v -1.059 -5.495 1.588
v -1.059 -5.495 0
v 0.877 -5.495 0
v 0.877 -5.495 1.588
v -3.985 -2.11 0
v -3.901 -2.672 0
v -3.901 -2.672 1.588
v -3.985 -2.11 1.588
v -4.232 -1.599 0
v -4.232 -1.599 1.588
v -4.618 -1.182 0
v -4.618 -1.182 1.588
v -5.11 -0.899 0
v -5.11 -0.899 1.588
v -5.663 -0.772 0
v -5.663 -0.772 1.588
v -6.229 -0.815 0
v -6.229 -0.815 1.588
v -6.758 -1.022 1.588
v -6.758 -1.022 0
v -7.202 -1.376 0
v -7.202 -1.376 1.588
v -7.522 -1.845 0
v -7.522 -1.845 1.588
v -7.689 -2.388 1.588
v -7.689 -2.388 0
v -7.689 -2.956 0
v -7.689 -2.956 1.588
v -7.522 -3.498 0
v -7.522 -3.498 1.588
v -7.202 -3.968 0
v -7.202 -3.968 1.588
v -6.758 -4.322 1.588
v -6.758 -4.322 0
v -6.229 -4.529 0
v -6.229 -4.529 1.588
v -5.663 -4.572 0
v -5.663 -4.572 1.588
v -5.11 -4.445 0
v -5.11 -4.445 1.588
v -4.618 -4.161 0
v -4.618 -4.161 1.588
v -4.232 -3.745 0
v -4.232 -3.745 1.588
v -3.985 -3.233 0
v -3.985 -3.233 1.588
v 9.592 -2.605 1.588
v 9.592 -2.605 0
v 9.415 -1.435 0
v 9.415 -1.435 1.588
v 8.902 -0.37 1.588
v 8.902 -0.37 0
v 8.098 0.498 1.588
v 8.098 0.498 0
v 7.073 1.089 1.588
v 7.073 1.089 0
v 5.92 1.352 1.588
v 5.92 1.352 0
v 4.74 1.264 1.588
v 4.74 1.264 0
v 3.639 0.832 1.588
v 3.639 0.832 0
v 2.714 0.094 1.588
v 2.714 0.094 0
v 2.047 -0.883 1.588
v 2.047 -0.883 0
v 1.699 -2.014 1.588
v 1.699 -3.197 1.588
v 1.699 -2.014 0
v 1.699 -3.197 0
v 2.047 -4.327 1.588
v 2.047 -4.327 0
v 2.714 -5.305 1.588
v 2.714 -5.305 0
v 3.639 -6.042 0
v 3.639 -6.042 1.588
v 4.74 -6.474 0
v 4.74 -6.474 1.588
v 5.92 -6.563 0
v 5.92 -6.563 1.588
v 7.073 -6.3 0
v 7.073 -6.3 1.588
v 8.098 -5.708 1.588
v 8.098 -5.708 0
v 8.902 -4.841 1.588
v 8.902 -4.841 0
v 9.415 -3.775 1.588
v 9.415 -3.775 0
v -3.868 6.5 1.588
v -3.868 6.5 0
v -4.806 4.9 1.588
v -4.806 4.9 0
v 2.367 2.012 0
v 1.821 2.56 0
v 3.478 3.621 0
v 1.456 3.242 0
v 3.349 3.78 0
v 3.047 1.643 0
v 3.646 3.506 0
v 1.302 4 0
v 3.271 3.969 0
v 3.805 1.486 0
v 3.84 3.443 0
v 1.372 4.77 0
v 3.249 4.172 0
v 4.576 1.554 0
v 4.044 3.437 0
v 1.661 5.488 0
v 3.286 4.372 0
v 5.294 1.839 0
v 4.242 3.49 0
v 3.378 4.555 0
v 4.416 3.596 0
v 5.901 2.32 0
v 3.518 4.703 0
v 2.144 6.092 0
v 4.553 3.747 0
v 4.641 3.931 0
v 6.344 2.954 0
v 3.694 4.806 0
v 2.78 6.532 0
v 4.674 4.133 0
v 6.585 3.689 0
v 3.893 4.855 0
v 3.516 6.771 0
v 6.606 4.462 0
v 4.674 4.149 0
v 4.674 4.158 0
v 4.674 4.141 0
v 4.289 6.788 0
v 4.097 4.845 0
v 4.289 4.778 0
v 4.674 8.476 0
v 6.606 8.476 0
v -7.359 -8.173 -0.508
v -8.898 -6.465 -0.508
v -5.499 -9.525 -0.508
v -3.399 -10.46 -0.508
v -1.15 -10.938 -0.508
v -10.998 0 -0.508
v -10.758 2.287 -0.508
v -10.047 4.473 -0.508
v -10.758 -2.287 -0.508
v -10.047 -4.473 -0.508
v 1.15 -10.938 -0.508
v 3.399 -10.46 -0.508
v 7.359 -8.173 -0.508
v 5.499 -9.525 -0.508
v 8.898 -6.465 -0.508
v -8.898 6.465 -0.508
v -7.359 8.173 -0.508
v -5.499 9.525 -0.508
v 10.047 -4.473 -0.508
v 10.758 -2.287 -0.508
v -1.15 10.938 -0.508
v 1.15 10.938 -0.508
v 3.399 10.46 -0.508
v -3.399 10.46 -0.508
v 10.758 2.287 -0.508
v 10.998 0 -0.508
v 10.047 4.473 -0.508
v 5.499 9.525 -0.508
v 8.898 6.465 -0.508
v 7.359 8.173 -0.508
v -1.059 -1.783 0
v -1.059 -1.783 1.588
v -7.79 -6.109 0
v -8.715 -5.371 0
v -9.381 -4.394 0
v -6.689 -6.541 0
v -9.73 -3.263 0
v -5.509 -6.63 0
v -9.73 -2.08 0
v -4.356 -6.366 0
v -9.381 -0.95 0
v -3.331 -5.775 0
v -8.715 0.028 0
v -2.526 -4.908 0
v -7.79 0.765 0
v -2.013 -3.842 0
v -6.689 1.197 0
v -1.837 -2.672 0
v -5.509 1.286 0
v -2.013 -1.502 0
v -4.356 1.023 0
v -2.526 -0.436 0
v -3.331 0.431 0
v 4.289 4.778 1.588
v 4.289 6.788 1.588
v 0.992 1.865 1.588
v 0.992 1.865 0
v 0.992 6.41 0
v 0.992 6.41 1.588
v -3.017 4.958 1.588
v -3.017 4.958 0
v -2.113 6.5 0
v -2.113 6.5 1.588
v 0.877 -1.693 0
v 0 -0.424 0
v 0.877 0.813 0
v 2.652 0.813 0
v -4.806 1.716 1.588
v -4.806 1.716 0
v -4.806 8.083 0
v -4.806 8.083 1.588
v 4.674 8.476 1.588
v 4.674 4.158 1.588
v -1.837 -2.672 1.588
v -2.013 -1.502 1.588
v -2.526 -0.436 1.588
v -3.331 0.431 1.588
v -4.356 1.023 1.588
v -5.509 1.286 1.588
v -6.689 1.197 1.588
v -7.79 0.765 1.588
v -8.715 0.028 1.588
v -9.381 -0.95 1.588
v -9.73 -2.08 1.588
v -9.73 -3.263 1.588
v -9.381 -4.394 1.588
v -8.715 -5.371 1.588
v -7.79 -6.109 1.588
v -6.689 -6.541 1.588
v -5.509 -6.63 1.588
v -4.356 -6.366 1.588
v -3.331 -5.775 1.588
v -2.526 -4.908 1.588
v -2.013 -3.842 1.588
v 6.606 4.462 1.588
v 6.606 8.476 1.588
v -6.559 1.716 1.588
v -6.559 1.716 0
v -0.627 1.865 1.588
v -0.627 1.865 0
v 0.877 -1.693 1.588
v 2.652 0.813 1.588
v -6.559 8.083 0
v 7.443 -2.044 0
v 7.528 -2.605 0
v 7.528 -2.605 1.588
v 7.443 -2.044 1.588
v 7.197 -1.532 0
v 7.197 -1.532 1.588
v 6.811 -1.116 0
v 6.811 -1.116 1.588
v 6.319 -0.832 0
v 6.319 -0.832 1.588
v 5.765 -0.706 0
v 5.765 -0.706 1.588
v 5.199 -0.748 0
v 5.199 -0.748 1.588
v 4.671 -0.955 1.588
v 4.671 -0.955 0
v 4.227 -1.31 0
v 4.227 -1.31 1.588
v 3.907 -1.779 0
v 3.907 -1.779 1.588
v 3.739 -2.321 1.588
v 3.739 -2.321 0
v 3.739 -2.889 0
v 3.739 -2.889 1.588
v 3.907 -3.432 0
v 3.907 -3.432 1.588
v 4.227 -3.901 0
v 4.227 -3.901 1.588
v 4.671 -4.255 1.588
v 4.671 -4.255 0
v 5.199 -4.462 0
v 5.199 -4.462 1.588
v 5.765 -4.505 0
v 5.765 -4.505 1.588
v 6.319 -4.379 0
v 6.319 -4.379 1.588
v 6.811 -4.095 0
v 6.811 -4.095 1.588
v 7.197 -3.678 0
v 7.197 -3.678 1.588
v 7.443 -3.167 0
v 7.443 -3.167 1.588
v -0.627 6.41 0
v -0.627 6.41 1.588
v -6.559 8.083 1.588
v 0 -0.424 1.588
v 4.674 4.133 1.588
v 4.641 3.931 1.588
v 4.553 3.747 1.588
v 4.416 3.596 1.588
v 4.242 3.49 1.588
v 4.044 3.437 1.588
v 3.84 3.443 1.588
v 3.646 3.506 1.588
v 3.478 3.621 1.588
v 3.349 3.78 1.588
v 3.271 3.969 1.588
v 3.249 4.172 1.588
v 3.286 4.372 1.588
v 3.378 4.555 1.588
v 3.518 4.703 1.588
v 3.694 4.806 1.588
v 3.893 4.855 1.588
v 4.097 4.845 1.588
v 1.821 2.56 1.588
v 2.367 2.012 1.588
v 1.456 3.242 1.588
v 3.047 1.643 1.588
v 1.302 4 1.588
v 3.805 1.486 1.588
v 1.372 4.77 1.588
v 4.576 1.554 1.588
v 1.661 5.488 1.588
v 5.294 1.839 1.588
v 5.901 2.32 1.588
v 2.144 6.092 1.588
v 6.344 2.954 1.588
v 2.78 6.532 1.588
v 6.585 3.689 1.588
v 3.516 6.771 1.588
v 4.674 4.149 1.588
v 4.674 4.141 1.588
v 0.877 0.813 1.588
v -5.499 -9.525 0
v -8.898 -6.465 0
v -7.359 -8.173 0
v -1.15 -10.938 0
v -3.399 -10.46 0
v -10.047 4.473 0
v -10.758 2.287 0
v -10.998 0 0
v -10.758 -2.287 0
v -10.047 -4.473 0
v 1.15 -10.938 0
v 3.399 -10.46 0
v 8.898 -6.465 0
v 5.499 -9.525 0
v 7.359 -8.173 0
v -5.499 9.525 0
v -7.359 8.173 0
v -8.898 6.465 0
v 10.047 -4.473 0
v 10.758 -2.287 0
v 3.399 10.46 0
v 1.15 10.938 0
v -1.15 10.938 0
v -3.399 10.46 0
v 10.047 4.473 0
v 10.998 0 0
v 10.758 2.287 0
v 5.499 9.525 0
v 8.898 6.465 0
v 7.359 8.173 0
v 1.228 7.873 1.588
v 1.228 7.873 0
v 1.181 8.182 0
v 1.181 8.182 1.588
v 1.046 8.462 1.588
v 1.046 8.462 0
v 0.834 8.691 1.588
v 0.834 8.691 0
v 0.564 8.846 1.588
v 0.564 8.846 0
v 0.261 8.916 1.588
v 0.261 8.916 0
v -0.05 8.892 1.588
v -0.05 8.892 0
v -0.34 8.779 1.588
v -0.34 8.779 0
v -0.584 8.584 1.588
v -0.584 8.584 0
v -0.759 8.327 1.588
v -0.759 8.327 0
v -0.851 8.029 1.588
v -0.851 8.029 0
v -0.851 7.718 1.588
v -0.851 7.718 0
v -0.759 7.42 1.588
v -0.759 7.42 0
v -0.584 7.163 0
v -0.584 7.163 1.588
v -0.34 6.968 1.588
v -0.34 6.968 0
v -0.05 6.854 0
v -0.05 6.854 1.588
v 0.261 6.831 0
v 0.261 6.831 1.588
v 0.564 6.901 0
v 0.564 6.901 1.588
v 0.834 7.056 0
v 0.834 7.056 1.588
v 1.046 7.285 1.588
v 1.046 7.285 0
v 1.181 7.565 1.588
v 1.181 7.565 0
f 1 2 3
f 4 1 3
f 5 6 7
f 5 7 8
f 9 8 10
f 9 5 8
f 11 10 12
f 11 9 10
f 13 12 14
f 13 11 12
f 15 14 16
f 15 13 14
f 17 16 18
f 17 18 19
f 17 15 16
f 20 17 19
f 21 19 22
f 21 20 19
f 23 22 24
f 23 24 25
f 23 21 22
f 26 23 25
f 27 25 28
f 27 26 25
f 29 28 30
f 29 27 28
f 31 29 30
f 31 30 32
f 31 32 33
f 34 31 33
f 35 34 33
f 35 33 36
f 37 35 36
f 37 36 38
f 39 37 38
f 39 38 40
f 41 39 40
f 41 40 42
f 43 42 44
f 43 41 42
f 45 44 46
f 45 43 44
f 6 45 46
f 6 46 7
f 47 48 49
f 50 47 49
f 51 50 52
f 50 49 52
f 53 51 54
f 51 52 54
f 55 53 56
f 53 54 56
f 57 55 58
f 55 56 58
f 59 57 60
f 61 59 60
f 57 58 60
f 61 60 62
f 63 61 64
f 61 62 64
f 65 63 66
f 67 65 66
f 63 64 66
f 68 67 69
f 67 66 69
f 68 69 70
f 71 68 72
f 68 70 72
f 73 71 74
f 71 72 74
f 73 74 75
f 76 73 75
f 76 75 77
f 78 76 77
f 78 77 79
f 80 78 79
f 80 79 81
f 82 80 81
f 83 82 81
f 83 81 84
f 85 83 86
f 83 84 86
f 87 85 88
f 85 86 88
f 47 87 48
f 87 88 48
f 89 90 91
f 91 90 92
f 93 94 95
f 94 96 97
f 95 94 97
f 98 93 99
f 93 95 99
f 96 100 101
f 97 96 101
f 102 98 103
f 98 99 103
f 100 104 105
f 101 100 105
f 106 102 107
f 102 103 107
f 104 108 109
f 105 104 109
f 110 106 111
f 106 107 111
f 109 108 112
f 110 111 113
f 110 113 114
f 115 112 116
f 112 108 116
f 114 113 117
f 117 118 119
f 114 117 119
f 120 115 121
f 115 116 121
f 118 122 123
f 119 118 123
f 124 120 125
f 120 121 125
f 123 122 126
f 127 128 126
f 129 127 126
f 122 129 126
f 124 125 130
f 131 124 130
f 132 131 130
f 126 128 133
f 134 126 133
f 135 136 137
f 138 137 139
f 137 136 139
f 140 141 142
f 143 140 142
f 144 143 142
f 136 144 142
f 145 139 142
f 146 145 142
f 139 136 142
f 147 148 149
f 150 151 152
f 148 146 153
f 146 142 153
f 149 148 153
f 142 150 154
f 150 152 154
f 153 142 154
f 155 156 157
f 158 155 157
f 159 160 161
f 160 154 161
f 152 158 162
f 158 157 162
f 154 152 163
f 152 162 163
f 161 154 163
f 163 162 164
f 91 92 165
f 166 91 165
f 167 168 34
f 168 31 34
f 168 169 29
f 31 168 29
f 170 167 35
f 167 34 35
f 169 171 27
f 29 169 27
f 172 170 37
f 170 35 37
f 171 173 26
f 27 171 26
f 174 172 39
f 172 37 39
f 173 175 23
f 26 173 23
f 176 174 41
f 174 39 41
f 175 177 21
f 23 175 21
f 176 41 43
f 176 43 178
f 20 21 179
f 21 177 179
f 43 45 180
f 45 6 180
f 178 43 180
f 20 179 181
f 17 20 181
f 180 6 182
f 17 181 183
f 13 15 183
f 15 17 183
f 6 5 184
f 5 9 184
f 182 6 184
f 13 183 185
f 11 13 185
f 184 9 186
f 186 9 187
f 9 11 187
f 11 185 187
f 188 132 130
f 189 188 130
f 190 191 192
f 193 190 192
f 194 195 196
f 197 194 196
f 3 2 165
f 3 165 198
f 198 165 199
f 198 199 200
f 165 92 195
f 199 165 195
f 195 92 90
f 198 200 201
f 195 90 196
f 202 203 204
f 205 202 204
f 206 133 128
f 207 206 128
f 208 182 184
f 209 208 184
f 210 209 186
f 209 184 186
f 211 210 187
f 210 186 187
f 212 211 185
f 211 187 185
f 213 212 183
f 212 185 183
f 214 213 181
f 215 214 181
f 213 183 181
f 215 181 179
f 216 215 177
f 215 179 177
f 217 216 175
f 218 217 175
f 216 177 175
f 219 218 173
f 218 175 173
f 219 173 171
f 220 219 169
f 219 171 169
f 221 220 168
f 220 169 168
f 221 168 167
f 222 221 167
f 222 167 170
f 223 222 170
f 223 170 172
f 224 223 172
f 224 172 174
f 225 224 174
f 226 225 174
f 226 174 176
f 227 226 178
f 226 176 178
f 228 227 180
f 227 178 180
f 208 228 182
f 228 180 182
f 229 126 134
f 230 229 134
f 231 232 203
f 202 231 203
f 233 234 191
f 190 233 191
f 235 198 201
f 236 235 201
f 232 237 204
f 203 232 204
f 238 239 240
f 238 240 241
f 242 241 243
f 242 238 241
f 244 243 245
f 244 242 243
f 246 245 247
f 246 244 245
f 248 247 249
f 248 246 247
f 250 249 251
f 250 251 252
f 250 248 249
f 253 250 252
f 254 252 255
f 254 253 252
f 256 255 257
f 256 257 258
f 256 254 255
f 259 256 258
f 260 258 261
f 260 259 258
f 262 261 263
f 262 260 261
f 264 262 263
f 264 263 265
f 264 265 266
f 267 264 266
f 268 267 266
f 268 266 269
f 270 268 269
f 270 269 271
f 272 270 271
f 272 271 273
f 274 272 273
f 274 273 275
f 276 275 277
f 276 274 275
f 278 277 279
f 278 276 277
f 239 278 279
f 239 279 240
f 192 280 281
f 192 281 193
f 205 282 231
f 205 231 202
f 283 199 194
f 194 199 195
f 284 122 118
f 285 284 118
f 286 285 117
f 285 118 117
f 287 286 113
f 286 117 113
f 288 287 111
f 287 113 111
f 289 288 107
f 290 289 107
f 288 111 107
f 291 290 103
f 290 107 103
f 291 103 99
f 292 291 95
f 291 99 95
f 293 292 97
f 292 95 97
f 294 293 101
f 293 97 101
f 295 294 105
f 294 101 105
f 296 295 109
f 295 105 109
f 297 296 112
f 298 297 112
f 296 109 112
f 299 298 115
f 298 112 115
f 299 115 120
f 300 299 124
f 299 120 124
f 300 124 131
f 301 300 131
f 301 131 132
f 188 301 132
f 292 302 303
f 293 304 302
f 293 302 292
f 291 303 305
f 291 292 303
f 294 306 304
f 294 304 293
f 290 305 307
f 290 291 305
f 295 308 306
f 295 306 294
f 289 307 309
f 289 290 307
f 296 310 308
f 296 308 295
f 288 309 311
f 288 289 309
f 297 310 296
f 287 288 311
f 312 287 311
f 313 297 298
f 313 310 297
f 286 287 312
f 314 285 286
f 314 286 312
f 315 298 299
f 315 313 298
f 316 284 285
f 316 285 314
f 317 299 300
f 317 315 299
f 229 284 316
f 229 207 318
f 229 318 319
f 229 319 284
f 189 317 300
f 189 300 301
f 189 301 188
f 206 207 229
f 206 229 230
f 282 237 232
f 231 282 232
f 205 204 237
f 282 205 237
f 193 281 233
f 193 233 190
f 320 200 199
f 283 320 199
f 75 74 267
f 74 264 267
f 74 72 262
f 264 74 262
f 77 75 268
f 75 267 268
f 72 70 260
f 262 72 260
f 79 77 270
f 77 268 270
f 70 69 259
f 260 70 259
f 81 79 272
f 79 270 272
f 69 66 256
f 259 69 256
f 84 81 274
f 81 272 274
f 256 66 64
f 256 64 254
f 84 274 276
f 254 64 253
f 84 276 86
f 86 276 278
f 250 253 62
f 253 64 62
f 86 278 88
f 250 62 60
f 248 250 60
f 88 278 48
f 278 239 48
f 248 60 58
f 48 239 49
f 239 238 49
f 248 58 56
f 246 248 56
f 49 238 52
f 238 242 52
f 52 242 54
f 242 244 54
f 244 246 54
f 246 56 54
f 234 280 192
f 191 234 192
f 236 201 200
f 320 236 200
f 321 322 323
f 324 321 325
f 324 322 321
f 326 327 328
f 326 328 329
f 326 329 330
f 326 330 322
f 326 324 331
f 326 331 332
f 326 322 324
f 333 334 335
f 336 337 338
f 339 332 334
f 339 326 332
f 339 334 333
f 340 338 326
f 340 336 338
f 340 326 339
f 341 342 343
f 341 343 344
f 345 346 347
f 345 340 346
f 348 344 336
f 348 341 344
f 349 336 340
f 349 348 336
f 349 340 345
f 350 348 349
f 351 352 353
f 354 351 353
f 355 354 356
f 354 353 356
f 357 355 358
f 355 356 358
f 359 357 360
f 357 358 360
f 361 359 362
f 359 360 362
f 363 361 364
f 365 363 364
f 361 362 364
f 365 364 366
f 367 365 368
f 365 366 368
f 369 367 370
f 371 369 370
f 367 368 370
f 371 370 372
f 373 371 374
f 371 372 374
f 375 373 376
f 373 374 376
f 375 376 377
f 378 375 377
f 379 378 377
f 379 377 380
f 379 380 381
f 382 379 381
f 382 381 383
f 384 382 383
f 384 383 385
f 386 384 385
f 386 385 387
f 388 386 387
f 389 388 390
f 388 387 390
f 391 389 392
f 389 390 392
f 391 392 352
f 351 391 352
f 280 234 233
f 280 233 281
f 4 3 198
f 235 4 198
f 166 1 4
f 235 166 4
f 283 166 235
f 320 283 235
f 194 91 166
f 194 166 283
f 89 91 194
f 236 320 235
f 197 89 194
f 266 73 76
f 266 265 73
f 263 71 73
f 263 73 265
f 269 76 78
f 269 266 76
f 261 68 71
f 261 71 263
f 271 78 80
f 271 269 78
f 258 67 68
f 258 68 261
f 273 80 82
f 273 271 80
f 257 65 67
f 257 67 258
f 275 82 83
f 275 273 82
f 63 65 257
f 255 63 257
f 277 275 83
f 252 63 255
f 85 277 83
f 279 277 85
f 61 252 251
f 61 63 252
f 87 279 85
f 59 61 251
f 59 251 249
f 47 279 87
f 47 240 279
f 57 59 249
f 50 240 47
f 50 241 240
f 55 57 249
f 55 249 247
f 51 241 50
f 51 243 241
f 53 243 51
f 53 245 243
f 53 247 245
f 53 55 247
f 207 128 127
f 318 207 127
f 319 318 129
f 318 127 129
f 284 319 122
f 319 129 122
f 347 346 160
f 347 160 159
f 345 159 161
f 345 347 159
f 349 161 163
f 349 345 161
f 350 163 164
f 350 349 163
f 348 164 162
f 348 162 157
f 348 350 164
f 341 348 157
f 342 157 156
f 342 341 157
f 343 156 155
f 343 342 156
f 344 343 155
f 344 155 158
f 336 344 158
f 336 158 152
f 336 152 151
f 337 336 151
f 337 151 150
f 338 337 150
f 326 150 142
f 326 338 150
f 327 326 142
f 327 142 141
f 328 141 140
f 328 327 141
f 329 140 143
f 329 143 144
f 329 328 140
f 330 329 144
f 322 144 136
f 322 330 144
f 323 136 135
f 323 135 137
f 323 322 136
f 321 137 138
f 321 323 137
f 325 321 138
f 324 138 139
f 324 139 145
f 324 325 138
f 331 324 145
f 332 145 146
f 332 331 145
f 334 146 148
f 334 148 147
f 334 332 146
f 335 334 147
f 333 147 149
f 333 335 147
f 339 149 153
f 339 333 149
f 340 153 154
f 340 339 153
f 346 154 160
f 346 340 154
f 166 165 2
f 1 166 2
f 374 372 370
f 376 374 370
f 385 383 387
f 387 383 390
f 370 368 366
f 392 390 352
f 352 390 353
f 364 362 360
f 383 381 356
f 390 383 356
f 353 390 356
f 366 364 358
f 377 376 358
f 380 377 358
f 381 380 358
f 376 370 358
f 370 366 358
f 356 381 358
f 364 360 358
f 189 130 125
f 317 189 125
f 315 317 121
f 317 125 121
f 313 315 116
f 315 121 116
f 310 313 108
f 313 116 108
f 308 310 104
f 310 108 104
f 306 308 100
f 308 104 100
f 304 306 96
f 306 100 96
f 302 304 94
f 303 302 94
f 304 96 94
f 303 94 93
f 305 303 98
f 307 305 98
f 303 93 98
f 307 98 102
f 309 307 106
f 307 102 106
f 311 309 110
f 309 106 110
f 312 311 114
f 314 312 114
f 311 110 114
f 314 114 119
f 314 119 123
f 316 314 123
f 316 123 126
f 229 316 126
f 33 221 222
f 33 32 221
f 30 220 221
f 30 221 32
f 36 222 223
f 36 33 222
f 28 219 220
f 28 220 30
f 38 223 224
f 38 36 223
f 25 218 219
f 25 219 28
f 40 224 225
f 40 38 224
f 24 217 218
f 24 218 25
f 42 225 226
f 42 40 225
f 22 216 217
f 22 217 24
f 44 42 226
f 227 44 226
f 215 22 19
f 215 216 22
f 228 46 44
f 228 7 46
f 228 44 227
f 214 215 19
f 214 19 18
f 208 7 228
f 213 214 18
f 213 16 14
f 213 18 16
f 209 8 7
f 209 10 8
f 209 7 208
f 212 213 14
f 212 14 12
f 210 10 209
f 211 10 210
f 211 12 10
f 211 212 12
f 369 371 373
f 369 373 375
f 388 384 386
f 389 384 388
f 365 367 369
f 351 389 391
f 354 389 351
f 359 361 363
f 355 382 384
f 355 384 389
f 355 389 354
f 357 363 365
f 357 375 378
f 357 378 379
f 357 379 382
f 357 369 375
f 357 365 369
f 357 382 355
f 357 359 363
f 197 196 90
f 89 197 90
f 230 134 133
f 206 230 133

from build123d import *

# Parameters (mm, degrees)
F0_R     = 10.9982
F1_DEPTH = 0.508
F3_DEPTH = 1.27
F2_W     = 1.2951166562
F2_H     = 3.6354111349
F2_R     = 0.8361544211
F2_R_2   = 3.175
F2_R_3   = 1.524
F4_SCALE = 1.25


with BuildPart() as f1:
    # F0 (on Top) → F1 (new body)
    with BuildSketch(Plane.XY):
        Circle(F0_R)
    extrude(amount=-F1_DEPTH)


with BuildPart() as f3:
    # F2 (on Top) → F3 (new body)
    with BuildSketch(Plane.XY):
        Polygon((-0.8474276173, -1.4266951149), (-0.8474276173, -4.39561418), (0.7013171111, -4.39561418), (0.7013171111, -1.3541933216), (2.1219371717, 0.6504660684), (0.7013171111, 0.6504660684), (0, -0.3391735764), (-2.4139480535, 3.9662072577), (-1.6904811083, 5.1996577531), (-3.0943236873, 5.1996577531), (-3.8450609427, 3.9197136648), align=None)
    extrude(amount=F3_DEPTH)


with BuildPart() as f3b:
    # F2 (on Top) → F3, piece 2 (new body)
    with BuildSketch(Plane.XY):
        Polygon((-3.8450609427, 1.3726343814), (-3.8450609427, 3.9197136648), (-3.8450609427, 6.4667929482), (-5.2475911869, 6.4667929482), (-5.2475911869, 1.3726343814), align=None)
    extrude(amount=F3_DEPTH)


with BuildPart() as f3c:
    # F2 (on Top) → F3, piece 3 (new body)
    with BuildSketch(Plane.XY):
        with Locations((0.1460003935, 3.3100993147)):
            Rectangle(F2_W, F2_H)
    extrude(amount=F3_DEPTH)


with BuildPart() as f3d:
    # F2 (on Top) → F3, piece 4 (new body)
    with BuildSketch(Plane.XY):
        with Locations((0.1460003935, 6.2987548299)):
            Circle(F2_R)
    extrude(amount=F3_DEPTH)


with BuildPart() as f3e:
    # F2 (on Top) → F3, piece 5 (new body)
    with BuildSketch(Plane.XY):
        with Locations((-4.644471146, -2.1374930238)):
            Circle(F2_R_2)
        with Locations((-4.644471146, -2.1374930238)):
            Circle(F2_R_3, mode=Mode.SUBTRACT)
    extrude(amount=F3_DEPTH)


with BuildPart() as f3f:
    # F2 (on Top) → F3, piece 6 (new body)
    with BuildSketch(Plane.XY):
        with Locations((4.4984421693, -2.0841928199)):
            Circle(F2_R_2)
        with Locations((4.4984421693, -2.0841928199)):
            Circle(F2_R_3, mode=Mode.SUBTRACT)
    extrude(amount=F3_DEPTH)


with BuildPart() as f3g:
    # F2 (on Top) → F3, piece 7 (new body)
    with BuildSketch(Plane.XY):
        with BuildLine():
            Line((3.4315840051, 3.822441707), (3.4315840051, 5.4306069392))
            ThreePointArc((3.4315840051, 5.4306069392), (1.6593378456, 1.8125938265), (5.2846923269, 3.5697734468))
            Line((5.2846923269, 3.5697734468), (5.2846923269, 6.7809580791))
            Line((5.2846923269, 6.7809580791), (3.7393509245, 6.7809580791))
            Line((3.7393509245, 6.7809580791), (3.7393509245, 3.3260008253))
            ThreePointArc((3.7393509245, 3.3260008253), (3.7394367375, 3.3161076992), (3.7393509245, 3.3062145731))
            ThreePointArc((3.7393509245, 3.3062145731), (2.6792539887, 3.0240571788), (3.4315840051, 3.822441707))
        make_face()
    extrude(amount=F3_DEPTH)


with BuildPart() as f3b_1:
    # F4: moved
    add(f3b.part.scale(F4_SCALE))


with BuildPart() as f3_1:
    # F4: moved
    add(f3.part.scale(F4_SCALE))


with BuildPart() as f3c_1:
    # F4: moved
    add(f3c.part.scale(F4_SCALE))


with BuildPart() as f3d_1:
    # F4: moved
    add(f3d.part.scale(F4_SCALE))


with BuildPart() as f3g_1:
    # F4: moved
    add(f3g.part.scale(F4_SCALE))


with BuildPart() as f3f_1:
    # F4: moved
    add(f3f.part.scale(F4_SCALE))


with BuildPart() as f3e_1:
    # F4: moved
    add(f3e.part.scale(F4_SCALE))


solid = Compound([f1.part, f3b_1.part, f3_1.part, f3c_1.part, f3d_1.part, f3g_1.part, f3f_1.part, f3e_1.part])
